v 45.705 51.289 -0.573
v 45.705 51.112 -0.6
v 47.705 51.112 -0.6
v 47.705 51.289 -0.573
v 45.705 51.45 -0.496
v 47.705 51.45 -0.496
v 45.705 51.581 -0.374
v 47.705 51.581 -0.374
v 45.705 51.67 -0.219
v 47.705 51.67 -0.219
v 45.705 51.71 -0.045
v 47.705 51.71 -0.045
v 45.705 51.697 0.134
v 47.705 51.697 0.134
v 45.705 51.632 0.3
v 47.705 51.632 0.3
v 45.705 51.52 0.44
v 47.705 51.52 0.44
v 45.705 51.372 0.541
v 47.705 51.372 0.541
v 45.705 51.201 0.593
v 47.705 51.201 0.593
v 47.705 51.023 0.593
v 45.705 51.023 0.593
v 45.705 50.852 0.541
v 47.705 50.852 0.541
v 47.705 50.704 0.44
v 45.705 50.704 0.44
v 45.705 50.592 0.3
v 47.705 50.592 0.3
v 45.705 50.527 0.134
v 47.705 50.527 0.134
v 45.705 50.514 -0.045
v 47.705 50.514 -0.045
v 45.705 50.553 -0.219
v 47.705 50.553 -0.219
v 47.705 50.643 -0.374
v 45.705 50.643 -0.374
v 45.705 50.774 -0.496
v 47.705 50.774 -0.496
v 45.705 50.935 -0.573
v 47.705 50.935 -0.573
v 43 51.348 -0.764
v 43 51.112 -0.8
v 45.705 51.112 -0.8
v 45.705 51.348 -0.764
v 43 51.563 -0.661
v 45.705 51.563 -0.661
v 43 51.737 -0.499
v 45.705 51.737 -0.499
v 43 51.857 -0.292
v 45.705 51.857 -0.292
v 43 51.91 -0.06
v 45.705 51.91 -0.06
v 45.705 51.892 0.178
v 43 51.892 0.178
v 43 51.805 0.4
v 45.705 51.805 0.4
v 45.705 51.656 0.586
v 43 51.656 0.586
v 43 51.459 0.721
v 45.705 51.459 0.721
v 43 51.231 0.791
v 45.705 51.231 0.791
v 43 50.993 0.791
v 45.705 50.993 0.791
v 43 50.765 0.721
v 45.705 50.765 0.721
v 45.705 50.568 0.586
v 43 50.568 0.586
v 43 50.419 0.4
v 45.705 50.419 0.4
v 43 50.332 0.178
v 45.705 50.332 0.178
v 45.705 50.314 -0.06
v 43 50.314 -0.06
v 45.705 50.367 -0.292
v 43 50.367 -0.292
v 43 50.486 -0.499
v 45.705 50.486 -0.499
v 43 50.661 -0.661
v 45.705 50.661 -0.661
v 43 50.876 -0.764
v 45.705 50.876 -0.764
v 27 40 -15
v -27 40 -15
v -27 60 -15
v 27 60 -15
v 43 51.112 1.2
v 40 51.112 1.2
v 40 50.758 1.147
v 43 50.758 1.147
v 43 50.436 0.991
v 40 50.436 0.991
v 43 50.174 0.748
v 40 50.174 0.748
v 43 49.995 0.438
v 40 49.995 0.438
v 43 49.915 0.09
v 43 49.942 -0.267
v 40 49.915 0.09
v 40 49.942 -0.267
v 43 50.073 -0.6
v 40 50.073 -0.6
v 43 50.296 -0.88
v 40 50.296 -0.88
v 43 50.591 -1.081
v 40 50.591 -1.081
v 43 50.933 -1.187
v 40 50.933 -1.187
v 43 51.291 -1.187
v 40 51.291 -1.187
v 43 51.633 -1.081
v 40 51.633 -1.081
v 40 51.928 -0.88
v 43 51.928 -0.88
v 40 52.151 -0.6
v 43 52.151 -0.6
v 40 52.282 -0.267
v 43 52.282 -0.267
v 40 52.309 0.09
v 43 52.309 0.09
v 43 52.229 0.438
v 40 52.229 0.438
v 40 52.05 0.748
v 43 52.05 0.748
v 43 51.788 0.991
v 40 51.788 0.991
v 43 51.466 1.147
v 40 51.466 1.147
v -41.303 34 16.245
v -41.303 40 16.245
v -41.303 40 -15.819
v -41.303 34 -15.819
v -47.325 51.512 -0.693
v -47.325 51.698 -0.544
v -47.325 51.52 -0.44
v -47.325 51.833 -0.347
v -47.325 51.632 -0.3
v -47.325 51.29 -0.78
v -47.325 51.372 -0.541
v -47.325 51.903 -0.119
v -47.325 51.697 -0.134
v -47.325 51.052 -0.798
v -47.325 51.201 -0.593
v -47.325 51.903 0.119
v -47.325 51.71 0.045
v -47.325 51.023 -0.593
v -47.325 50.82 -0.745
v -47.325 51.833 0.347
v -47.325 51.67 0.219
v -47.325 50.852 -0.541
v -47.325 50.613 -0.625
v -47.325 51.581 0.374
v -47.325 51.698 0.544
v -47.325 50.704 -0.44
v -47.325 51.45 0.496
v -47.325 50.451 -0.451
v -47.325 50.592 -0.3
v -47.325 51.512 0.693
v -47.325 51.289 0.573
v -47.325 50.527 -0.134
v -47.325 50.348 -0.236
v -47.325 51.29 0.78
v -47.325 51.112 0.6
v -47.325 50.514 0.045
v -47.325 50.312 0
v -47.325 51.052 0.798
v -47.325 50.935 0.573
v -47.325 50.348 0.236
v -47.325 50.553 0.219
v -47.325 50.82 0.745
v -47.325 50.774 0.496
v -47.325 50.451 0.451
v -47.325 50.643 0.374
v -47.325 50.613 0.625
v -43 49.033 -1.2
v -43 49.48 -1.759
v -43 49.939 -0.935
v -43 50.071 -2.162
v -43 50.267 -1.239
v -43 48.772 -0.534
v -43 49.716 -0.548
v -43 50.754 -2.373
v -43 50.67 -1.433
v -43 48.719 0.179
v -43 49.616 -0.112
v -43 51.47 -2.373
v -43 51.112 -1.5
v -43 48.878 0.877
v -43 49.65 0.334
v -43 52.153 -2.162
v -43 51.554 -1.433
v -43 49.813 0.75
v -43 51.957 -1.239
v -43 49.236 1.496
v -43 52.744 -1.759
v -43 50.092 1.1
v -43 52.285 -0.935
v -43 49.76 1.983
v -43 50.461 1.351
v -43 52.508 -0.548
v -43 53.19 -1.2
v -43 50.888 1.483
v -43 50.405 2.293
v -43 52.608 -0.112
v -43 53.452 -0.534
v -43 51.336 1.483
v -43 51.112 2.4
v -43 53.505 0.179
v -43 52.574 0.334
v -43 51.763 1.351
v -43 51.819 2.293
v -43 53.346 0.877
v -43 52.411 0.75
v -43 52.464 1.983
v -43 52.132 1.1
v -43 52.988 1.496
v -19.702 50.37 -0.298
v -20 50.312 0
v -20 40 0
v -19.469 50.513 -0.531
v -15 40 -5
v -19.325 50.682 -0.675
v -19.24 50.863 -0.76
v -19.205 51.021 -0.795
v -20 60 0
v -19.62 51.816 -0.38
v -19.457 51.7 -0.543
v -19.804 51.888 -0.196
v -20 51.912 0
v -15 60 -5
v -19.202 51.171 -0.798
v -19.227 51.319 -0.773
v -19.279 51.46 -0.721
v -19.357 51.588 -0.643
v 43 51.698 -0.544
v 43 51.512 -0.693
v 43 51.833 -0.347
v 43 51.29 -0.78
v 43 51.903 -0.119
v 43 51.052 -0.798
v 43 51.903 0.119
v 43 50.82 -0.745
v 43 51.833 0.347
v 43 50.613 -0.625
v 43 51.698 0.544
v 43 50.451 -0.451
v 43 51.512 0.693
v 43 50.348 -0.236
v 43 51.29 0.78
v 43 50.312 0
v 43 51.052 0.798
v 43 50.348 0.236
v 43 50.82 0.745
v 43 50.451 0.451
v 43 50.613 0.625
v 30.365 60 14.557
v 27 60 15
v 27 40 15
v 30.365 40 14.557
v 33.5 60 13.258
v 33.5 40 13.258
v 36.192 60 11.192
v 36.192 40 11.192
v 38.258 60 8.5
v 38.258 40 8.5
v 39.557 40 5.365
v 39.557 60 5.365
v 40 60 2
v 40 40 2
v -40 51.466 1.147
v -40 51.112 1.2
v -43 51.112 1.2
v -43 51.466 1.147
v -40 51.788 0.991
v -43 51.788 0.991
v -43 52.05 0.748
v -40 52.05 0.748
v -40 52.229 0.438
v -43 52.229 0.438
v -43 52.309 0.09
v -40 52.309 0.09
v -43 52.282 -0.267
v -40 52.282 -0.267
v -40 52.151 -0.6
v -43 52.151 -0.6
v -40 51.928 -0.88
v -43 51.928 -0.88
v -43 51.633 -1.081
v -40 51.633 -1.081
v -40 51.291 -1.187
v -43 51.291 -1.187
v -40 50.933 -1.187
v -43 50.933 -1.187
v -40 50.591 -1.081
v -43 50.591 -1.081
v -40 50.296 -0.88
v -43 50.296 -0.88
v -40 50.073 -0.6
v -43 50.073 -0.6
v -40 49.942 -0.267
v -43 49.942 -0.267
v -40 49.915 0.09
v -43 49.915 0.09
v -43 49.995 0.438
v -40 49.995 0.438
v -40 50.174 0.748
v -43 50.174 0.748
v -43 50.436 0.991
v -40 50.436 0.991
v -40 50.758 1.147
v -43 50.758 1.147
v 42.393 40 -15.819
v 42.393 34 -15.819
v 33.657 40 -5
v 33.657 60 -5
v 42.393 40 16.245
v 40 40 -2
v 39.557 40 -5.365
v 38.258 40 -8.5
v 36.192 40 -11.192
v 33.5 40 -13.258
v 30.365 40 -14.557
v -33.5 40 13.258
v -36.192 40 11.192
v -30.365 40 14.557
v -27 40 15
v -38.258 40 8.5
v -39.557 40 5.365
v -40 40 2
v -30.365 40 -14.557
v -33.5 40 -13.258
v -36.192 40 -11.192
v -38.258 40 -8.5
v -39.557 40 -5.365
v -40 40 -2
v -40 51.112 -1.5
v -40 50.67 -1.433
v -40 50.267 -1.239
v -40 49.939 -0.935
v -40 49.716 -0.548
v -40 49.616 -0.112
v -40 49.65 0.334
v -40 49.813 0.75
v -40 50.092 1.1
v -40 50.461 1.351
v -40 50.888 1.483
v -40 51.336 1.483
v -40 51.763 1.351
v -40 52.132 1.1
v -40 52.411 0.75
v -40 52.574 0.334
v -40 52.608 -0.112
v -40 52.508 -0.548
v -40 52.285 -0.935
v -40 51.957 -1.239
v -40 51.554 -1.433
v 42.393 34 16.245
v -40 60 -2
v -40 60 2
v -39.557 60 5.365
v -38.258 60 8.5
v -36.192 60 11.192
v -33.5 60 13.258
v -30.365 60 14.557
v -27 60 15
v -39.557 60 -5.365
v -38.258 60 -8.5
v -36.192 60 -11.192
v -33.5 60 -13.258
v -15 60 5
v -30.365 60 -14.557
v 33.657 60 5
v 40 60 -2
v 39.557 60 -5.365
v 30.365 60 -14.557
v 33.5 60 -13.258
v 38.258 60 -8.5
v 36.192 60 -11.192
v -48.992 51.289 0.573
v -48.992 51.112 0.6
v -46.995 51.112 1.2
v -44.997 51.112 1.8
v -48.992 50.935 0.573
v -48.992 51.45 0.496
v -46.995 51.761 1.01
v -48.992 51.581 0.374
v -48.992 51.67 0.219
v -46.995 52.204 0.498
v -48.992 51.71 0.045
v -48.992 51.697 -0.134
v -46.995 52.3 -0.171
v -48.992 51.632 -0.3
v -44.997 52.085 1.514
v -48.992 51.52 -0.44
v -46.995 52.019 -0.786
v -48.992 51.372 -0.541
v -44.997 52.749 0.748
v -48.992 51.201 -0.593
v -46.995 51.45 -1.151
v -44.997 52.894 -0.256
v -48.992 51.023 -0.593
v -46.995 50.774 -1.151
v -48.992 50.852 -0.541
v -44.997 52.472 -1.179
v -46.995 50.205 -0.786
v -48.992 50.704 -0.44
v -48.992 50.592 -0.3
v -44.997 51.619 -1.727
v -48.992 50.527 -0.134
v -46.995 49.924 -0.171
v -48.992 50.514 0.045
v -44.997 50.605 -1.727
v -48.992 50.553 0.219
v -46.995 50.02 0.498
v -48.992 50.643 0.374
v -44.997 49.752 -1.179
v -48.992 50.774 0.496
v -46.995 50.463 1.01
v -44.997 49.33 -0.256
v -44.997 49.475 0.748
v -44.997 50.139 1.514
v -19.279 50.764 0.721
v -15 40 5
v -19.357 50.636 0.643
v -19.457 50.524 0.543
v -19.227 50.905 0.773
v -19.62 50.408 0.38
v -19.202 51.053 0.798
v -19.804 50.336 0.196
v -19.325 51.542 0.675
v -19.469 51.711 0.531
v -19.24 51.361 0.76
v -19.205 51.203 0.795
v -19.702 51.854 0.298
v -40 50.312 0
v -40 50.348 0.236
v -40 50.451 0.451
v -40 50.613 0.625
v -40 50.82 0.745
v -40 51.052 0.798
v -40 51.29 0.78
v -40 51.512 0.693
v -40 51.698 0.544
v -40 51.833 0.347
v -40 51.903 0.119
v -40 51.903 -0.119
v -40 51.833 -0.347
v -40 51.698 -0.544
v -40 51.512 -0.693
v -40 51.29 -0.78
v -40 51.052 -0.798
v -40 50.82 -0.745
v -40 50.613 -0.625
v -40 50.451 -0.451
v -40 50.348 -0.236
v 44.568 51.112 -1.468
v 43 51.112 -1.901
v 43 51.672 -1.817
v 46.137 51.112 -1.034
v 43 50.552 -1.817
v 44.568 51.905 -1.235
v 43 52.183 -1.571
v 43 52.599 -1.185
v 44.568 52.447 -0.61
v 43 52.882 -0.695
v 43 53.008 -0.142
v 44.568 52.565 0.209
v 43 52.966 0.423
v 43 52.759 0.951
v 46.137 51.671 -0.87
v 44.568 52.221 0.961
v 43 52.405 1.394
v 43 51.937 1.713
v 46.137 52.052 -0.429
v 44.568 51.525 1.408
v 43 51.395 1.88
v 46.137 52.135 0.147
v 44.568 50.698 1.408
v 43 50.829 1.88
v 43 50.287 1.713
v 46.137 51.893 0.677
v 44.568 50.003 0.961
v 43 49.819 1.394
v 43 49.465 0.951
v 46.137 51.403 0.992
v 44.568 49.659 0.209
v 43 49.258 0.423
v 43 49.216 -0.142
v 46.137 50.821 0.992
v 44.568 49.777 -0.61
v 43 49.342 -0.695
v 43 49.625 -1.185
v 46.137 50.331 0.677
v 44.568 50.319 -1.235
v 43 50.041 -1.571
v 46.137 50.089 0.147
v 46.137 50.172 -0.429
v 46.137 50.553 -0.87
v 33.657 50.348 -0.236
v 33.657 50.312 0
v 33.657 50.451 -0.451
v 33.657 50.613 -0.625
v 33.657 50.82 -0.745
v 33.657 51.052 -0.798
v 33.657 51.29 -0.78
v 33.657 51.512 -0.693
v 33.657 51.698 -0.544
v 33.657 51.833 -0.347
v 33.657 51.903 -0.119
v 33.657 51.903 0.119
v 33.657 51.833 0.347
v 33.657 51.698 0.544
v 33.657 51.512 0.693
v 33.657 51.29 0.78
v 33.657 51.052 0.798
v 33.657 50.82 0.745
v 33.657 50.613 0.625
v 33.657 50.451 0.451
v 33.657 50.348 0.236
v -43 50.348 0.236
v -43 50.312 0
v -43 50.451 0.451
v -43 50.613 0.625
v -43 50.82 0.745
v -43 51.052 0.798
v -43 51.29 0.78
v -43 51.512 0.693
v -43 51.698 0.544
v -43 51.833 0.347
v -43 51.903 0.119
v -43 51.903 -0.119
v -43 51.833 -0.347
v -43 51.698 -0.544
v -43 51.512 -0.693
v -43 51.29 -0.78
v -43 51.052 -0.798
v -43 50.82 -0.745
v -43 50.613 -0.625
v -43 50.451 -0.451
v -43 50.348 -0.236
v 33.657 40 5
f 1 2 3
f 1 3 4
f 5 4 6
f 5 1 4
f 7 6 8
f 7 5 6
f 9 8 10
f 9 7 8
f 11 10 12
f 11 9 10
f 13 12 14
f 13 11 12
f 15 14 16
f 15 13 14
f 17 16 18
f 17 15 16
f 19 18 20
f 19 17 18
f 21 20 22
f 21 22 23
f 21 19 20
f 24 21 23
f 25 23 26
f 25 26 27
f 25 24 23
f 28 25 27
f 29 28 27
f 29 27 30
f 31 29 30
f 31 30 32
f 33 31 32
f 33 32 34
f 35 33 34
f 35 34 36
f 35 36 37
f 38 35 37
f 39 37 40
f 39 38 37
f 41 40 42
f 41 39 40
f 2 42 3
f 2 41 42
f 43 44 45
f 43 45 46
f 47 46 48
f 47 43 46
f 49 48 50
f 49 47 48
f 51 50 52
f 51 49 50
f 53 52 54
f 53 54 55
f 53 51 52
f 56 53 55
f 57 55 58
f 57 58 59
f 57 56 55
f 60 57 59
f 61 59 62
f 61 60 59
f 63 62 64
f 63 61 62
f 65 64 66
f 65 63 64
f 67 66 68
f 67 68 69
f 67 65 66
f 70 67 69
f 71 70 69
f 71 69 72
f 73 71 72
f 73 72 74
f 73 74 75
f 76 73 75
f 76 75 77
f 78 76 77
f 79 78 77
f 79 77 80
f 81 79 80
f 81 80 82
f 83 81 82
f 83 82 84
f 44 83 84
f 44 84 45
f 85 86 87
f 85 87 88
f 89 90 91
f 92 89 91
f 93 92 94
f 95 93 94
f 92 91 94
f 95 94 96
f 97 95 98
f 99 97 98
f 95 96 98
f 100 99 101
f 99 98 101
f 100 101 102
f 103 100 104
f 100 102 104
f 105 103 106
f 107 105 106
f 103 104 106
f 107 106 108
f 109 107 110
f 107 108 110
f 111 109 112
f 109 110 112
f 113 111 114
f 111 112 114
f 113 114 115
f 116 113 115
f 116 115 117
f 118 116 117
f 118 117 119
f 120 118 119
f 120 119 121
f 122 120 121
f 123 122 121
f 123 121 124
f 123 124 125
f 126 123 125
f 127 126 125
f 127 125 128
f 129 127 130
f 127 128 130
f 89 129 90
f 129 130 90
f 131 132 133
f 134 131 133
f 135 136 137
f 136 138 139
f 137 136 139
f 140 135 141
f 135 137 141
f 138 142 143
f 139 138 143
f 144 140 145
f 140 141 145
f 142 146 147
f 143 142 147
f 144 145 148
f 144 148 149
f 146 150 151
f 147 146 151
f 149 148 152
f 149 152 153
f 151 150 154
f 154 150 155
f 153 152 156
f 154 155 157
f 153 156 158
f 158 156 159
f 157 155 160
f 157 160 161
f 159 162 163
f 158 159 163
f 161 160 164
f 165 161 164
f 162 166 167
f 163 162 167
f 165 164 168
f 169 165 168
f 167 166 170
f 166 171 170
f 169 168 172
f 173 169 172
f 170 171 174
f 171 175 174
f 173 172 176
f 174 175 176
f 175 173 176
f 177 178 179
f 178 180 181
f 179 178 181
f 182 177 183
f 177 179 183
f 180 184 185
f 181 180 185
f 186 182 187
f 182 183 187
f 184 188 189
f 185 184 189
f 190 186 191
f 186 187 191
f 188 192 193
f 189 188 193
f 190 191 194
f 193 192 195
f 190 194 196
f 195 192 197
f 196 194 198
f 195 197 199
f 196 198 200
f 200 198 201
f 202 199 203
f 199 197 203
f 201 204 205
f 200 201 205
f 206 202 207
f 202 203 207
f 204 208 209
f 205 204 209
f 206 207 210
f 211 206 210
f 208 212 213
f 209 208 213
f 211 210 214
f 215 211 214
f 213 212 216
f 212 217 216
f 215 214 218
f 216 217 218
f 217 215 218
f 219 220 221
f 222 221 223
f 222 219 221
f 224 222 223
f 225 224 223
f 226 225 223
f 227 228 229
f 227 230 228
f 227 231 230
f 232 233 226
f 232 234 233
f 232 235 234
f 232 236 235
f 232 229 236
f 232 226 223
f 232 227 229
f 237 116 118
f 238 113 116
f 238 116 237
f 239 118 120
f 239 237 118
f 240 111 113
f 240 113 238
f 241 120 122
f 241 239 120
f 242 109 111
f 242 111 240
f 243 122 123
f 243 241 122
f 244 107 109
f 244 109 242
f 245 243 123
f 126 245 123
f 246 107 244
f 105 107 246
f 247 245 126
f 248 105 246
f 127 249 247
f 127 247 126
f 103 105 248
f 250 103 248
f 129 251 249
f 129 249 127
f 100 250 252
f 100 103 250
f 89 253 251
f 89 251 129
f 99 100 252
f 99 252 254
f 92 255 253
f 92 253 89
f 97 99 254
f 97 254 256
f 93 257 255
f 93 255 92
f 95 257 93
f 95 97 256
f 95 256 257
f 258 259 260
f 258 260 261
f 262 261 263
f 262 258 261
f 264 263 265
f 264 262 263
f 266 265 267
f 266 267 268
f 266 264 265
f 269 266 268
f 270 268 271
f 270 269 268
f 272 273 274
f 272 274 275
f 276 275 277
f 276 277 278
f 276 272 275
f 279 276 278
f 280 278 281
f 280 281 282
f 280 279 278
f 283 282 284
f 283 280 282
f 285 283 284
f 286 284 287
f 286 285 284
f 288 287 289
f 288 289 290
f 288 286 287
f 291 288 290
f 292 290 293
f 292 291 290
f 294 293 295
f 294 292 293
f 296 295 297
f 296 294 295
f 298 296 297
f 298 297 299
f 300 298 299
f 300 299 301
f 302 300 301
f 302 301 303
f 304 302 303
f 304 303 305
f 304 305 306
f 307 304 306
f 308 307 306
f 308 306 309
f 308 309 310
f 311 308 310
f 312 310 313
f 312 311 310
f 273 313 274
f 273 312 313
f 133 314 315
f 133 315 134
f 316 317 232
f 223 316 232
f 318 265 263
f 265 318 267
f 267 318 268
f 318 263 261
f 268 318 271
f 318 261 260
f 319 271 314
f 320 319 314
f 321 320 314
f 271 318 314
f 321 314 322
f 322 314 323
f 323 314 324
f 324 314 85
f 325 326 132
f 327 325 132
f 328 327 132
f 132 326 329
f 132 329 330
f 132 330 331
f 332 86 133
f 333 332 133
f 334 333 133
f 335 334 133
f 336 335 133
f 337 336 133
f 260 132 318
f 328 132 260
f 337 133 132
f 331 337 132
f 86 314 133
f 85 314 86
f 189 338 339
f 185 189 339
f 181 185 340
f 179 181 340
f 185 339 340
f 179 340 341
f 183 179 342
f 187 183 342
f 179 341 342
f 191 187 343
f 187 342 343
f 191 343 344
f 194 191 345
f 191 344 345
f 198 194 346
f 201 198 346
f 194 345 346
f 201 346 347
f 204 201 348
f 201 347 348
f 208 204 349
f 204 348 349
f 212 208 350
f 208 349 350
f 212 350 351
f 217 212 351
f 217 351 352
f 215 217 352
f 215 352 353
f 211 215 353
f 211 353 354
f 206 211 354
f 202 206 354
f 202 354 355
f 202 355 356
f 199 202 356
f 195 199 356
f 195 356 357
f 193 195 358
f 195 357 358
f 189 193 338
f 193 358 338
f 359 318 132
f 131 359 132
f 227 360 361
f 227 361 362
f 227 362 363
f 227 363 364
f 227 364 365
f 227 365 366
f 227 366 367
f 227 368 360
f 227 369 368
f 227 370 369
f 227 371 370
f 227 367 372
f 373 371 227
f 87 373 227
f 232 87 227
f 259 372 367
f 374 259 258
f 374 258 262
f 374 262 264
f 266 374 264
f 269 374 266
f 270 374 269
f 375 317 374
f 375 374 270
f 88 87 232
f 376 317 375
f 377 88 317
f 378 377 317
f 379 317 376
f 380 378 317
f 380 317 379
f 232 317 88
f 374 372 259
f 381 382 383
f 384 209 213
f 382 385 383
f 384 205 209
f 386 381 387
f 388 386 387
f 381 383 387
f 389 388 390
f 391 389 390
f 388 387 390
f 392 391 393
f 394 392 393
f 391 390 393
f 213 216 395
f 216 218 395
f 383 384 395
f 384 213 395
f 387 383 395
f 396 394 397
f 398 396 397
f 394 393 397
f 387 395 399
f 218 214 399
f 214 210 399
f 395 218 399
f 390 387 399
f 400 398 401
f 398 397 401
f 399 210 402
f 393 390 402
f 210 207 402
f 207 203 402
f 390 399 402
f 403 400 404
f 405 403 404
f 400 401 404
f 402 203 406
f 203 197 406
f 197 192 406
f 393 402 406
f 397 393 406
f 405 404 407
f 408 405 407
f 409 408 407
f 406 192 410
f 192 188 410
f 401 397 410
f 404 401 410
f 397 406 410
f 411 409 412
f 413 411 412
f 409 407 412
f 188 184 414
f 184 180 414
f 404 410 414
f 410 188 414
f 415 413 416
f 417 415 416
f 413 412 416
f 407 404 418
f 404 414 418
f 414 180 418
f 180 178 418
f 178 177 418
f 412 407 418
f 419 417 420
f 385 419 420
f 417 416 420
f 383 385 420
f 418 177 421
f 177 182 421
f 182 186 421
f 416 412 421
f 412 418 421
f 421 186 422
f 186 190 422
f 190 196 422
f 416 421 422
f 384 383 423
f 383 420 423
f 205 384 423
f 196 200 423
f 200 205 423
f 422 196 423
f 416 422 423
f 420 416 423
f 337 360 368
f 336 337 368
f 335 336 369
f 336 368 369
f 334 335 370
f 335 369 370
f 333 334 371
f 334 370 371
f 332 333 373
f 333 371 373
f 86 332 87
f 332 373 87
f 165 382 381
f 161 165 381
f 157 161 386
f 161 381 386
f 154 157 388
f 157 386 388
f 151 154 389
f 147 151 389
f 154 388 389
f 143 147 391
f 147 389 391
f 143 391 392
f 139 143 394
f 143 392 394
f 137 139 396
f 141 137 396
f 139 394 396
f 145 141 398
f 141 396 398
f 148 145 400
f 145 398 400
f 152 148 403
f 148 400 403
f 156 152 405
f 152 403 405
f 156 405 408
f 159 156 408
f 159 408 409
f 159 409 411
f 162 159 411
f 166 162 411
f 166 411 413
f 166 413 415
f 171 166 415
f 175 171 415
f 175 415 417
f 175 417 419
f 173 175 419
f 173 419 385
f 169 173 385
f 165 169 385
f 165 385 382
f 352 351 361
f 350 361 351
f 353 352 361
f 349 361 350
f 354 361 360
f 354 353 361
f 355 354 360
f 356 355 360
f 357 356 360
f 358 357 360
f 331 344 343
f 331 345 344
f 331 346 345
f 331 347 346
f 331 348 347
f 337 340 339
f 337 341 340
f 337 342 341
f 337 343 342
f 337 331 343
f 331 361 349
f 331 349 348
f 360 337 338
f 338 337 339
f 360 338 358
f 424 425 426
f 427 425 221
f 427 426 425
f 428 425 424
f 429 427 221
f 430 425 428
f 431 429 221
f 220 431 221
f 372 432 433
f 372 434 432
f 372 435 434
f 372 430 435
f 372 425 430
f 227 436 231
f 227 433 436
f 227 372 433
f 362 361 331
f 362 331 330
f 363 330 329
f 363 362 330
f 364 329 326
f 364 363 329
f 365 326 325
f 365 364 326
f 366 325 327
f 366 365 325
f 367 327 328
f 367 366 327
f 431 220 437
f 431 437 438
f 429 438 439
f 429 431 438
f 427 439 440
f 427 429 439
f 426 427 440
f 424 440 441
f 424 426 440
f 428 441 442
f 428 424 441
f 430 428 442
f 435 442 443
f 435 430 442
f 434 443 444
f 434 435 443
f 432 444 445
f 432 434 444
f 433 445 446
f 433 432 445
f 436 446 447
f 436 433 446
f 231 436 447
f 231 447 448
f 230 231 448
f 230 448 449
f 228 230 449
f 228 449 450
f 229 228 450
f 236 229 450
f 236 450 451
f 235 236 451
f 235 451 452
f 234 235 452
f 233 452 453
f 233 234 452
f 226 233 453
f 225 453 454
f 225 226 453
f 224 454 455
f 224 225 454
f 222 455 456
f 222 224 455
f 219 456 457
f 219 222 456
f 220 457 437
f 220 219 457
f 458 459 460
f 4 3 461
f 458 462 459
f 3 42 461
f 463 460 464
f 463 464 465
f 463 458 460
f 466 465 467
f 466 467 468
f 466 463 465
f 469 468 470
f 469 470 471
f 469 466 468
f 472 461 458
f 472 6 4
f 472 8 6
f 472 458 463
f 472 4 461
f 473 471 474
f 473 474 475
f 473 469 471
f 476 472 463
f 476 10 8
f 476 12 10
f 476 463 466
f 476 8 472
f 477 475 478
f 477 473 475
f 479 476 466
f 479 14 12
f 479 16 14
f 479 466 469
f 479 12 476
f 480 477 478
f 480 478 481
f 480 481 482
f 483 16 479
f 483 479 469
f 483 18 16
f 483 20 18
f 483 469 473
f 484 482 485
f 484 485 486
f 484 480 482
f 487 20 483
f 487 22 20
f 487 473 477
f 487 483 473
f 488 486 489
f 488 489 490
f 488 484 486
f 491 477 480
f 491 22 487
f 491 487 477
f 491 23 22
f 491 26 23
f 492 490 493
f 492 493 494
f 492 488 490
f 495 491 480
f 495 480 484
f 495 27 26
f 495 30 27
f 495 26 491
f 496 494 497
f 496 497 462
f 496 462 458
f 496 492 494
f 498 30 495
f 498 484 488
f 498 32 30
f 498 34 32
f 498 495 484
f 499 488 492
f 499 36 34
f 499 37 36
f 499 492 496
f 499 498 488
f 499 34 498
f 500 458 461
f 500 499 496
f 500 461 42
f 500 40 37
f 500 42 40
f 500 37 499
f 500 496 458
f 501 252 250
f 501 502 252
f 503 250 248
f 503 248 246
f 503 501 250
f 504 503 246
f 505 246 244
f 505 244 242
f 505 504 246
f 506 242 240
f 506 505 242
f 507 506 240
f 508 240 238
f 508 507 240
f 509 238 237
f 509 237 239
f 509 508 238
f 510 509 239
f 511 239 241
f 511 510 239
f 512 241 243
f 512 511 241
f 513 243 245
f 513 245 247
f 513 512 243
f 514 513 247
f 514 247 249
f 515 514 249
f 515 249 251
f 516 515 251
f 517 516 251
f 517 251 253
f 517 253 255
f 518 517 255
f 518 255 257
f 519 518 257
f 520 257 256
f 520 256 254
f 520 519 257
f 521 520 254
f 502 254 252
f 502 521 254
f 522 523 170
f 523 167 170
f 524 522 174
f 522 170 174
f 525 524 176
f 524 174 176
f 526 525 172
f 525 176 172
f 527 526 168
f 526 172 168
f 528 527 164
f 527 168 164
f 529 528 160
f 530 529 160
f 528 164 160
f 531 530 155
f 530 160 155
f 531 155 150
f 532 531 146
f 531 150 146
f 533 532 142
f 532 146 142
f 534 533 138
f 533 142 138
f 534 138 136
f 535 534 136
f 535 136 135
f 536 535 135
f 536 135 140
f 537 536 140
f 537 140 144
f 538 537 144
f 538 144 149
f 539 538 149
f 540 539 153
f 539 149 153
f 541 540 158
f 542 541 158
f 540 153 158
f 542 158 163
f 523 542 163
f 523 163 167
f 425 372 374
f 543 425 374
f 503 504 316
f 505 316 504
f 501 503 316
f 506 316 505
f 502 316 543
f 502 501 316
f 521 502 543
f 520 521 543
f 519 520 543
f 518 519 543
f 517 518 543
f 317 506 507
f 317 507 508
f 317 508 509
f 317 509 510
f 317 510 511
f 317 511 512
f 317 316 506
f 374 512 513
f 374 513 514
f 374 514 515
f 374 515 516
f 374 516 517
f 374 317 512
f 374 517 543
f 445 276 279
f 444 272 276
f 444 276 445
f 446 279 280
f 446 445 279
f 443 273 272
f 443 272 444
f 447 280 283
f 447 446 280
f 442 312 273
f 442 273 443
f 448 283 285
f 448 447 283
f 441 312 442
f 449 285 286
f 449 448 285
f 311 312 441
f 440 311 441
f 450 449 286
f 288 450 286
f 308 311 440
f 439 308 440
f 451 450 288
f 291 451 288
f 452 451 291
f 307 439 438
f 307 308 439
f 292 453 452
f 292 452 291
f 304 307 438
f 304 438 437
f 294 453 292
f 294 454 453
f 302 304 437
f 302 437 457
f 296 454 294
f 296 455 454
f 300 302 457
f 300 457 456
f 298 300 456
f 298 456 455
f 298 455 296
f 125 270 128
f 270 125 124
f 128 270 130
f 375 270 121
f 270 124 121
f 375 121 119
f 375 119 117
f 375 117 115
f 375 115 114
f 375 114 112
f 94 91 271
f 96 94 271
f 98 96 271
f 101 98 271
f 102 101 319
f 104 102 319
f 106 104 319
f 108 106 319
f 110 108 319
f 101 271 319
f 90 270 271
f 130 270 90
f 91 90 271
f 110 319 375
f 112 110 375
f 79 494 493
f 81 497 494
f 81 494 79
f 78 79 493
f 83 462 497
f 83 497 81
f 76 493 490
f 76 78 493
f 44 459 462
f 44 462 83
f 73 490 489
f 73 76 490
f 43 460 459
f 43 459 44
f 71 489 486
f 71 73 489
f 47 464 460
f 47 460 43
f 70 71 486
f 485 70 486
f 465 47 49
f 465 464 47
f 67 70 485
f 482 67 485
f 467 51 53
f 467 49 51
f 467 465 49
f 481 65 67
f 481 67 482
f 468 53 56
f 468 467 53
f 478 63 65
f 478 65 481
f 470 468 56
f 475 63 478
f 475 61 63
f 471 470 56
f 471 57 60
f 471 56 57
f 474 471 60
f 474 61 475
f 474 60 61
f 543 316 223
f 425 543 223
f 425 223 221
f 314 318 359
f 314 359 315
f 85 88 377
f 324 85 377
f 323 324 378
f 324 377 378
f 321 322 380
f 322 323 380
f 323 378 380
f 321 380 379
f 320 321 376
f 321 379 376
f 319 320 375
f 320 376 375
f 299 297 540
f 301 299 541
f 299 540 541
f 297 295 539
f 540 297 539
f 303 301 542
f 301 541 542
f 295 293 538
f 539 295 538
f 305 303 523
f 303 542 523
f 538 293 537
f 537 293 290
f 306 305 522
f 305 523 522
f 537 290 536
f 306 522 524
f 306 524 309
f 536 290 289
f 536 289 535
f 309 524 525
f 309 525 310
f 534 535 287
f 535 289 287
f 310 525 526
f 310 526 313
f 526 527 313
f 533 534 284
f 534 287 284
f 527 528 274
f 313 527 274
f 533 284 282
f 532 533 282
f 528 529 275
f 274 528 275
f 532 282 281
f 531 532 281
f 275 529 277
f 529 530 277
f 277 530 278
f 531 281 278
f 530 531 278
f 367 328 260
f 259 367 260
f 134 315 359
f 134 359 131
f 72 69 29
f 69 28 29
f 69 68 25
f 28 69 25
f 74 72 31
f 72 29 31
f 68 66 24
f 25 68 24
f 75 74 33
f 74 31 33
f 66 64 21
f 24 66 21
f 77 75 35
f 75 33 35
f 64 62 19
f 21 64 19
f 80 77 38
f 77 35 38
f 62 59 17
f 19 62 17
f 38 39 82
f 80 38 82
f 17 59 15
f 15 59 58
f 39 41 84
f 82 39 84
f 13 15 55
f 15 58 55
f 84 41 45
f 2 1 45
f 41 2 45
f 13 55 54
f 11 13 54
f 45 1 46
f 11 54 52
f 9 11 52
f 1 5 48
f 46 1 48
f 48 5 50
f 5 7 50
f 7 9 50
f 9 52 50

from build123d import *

# Parameters (mm, degrees)
SKETCH1_W               = 80
SKETCH1_H               = 30
BOSS_EXTRUDE1_DEPTH     = 60
CUT_EXTRUDE1_DEPTH      = 75
CUT_EXTRUDE2_DEPTH      = 102.118742081
CUT_EXTRUDE2_DEPTH_BACK = 102.118742081
SKETCH3_R               = 0.8
SKETCH4_R               = 1.5
SKETCH4_R_2             = 1.2
BOSS_EXTRUDE2_DEPTH     = 3
SKETCH7_R               = 0.6
CUT_EXTRUDE3_DEPTH      = 2
SKETCH8_R               = 0.8
CUT_EXTRUDE4_DEPTH      = 53
FILLET1_R               = 13
SKETCH9_R               = 1.2
SKETCH9_R_2             = 0.8
BOSS_EXTRUDE3_DEPTH     = 3
CUT_EXTRUDE5_START      = -2
SKETCH12_R              = 0.6
CUT_EXTRUDE5_DEPTH      = 2
CUT_EXTRUDE6_START      = -35
SKETCH14_R              = 0.8
CUT_EXTRUDE6_DEPTH      = 35
SKETCH15_W              = 83.696095513
SKETCH15_H              = 31.69844841
CUT_EXTRUDE7_DEPTH      = 50
SKETCH16_W              = 83.696095513
SKETCH16_H              = 32.064199738
BOSS_EXTRUDE4_DEPTH     = 6


with BuildPart() as part:
    # Sketch1 → Boss-Extrude1 (new body)
    with BuildSketch(Plane(origin=(0, 0, 0), x_dir=(1, 0, 0), z_dir=(0, 1, 0))):
        Rectangle(SKETCH1_W, SKETCH1_H)
    extrude(amount=BOSS_EXTRUDE1_DEPTH)

    # Sketch2 → Cut-Extrude1 (cut)
    with BuildSketch(Plane(origin=(0, 60, 0), x_dir=(1, 0, 0), z_dir=(0, 1, 0))):
        Polygon((-15, 5), (15, 5), (33.657016573, 5), (33.657016573, -5), (15, -5), (-15, -5), (-20, 0), align=None)
    extrude(amount=-CUT_EXTRUDE1_DEPTH, mode=Mode.SUBTRACT)

    # Sketch3 → Cut-Extrude2 (cut, two sides: drawn at the far end of the back side and taken through both)
    with BuildSketch(Plane.ZY.offset(40).offset(-CUT_EXTRUDE2_DEPTH_BACK)):
        with Locations(Location((0, 51.111959895, 0), (0, 0, 270))):
            Circle(SKETCH3_R)
    extrude(amount=CUT_EXTRUDE2_DEPTH + CUT_EXTRUDE2_DEPTH_BACK, mode=Mode.SUBTRACT)

    # Sketch4 → Boss-Extrude2 (add)
    with BuildSketch(Plane.ZY.offset(40)):
        with Locations(Location((0, 51.111959895, 0), (0, 0, 180))):
            Circle(SKETCH4_R)
        with Locations((0, 51.111959895)):
            Circle(SKETCH4_R_2, mode=Mode.SUBTRACT)
    extrude(amount=BOSS_EXTRUDE2_DEPTH)

    # Sketch6 → Revolve1 (revolve)
    with BuildSketch(Plane.XY, mode=Mode.PRIVATE) as revolve1_sk:
        Polygon((-43, 51.111959895), (-49.325220868, 51.111959895), (-49.325220868, 51.611959895), (-43, 53.511959895), align=None)
    revolve(revolve1_sk.sketch.rotate(Axis((-43, 51.111959895, 0), (-1, 0, 0)), 270), axis=Axis((-43, 51.111959895, 0), (-1, 0, 0)))

    # Sketch7 → Cut-Extrude3 (cut)
    with BuildSketch(Plane.ZY.offset(49.325220868)):
        with Locations((0, 51.111959895)):
            Circle(SKETCH7_R)
    extrude(amount=-CUT_EXTRUDE3_DEPTH, mode=Mode.SUBTRACT)

    # Sketch8 → Cut-Extrude4 (cut)
    with BuildSketch(Plane.ZY.offset(47.325220868)):
        with Locations(Location((0, 51.111959895, 0), (0, 0, 270))):
            Circle(SKETCH8_R)
    extrude(amount=-CUT_EXTRUDE4_DEPTH, mode=Mode.SUBTRACT)

    # Fillet1
    fillet1_edges = [part.edges().sort_by_distance(p)[0] for p in [
        (40, 30, 15),
        (-40, 30, 15),
        (-40, 30, -15),
        (40, 30, -15),
    ]]
    fillet(fillet1_edges, radius=FILLET1_R)

    # Sketch9 → Boss-Extrude3 (add)
    with BuildSketch(Plane(origin=(40, 0, 0), x_dir=(0, 0, -1), z_dir=(1, 0, 0))):
        with Locations(Location((0, 51.111959895, 0), (0, 0, 180))):
            Circle(SKETCH9_R)
        with Locations(Location((0, 51.111959895, 0), (0, 0, 270))):
            Circle(SKETCH9_R_2, mode=Mode.SUBTRACT)
    extrude(amount=BOSS_EXTRUDE3_DEPTH)

    # Sketch15 → Cut-Extrude7 (cut)
    with BuildSketch(Plane(origin=(0, -10, 0), x_dir=(-1, 0, 0), z_dir=(0, -1, 0))):
        with Locations((-0.057440767, 0.030479277)):
            Rectangle(SKETCH15_W, SKETCH15_H)
    extrude(amount=-CUT_EXTRUDE7_DEPTH, mode=Mode.SUBTRACT)

    # Sketch16 → Boss-Extrude4 (add)
    with BuildSketch(Plane(origin=(0, 40, 0), x_dir=(-1, 0, 0), z_dir=(0, -1, 0))):
        with Locations((-0.545109204, -0.213354941)):
            Rectangle(SKETCH16_W, SKETCH16_H)
    extrude(amount=BOSS_EXTRUDE4_DEPTH)


with BuildPart() as body_2:
    # Sketch11 → Revolve2 (revolve)
    with BuildSketch(Plane.XY, mode=Mode.PRIVATE) as revolve2_sk:
        Polygon((43, 51.111959895), (43, 53.013316413), (47.705149283, 51.711959895), (47.705149283, 51.111959895), align=None)
    revolve(revolve2_sk.sketch.rotate(Axis((43, 51.111959895, 0), (1, 0, 0)), 270), axis=Axis((43, 51.111959895, 0), (1, 0, 0)))

    # Sketch12 → Cut-Extrude5 (cut)
    with BuildSketch(Plane(origin=(47.705149283, 0, 0), x_dir=(0, 0, -1), z_dir=(1, 0, 0)).offset(CUT_EXTRUDE5_START)):
        with Locations((0, 51.111959895)):
            Circle(SKETCH12_R)
    extrude(amount=CUT_EXTRUDE5_DEPTH, mode=Mode.SUBTRACT)

    # Sketch14 → Cut-Extrude6 (cut)
    with BuildSketch(Plane(origin=(45.705149283, 0, 0), x_dir=(0, 0, -1), z_dir=(1, 0, 0)).offset(CUT_EXTRUDE6_START)):
        with Locations((0, 51.111959895)):
            Circle(SKETCH14_R)
    extrude(amount=CUT_EXTRUDE6_DEPTH, mode=Mode.SUBTRACT)


solid = Compound([part.part, body_2.part])
